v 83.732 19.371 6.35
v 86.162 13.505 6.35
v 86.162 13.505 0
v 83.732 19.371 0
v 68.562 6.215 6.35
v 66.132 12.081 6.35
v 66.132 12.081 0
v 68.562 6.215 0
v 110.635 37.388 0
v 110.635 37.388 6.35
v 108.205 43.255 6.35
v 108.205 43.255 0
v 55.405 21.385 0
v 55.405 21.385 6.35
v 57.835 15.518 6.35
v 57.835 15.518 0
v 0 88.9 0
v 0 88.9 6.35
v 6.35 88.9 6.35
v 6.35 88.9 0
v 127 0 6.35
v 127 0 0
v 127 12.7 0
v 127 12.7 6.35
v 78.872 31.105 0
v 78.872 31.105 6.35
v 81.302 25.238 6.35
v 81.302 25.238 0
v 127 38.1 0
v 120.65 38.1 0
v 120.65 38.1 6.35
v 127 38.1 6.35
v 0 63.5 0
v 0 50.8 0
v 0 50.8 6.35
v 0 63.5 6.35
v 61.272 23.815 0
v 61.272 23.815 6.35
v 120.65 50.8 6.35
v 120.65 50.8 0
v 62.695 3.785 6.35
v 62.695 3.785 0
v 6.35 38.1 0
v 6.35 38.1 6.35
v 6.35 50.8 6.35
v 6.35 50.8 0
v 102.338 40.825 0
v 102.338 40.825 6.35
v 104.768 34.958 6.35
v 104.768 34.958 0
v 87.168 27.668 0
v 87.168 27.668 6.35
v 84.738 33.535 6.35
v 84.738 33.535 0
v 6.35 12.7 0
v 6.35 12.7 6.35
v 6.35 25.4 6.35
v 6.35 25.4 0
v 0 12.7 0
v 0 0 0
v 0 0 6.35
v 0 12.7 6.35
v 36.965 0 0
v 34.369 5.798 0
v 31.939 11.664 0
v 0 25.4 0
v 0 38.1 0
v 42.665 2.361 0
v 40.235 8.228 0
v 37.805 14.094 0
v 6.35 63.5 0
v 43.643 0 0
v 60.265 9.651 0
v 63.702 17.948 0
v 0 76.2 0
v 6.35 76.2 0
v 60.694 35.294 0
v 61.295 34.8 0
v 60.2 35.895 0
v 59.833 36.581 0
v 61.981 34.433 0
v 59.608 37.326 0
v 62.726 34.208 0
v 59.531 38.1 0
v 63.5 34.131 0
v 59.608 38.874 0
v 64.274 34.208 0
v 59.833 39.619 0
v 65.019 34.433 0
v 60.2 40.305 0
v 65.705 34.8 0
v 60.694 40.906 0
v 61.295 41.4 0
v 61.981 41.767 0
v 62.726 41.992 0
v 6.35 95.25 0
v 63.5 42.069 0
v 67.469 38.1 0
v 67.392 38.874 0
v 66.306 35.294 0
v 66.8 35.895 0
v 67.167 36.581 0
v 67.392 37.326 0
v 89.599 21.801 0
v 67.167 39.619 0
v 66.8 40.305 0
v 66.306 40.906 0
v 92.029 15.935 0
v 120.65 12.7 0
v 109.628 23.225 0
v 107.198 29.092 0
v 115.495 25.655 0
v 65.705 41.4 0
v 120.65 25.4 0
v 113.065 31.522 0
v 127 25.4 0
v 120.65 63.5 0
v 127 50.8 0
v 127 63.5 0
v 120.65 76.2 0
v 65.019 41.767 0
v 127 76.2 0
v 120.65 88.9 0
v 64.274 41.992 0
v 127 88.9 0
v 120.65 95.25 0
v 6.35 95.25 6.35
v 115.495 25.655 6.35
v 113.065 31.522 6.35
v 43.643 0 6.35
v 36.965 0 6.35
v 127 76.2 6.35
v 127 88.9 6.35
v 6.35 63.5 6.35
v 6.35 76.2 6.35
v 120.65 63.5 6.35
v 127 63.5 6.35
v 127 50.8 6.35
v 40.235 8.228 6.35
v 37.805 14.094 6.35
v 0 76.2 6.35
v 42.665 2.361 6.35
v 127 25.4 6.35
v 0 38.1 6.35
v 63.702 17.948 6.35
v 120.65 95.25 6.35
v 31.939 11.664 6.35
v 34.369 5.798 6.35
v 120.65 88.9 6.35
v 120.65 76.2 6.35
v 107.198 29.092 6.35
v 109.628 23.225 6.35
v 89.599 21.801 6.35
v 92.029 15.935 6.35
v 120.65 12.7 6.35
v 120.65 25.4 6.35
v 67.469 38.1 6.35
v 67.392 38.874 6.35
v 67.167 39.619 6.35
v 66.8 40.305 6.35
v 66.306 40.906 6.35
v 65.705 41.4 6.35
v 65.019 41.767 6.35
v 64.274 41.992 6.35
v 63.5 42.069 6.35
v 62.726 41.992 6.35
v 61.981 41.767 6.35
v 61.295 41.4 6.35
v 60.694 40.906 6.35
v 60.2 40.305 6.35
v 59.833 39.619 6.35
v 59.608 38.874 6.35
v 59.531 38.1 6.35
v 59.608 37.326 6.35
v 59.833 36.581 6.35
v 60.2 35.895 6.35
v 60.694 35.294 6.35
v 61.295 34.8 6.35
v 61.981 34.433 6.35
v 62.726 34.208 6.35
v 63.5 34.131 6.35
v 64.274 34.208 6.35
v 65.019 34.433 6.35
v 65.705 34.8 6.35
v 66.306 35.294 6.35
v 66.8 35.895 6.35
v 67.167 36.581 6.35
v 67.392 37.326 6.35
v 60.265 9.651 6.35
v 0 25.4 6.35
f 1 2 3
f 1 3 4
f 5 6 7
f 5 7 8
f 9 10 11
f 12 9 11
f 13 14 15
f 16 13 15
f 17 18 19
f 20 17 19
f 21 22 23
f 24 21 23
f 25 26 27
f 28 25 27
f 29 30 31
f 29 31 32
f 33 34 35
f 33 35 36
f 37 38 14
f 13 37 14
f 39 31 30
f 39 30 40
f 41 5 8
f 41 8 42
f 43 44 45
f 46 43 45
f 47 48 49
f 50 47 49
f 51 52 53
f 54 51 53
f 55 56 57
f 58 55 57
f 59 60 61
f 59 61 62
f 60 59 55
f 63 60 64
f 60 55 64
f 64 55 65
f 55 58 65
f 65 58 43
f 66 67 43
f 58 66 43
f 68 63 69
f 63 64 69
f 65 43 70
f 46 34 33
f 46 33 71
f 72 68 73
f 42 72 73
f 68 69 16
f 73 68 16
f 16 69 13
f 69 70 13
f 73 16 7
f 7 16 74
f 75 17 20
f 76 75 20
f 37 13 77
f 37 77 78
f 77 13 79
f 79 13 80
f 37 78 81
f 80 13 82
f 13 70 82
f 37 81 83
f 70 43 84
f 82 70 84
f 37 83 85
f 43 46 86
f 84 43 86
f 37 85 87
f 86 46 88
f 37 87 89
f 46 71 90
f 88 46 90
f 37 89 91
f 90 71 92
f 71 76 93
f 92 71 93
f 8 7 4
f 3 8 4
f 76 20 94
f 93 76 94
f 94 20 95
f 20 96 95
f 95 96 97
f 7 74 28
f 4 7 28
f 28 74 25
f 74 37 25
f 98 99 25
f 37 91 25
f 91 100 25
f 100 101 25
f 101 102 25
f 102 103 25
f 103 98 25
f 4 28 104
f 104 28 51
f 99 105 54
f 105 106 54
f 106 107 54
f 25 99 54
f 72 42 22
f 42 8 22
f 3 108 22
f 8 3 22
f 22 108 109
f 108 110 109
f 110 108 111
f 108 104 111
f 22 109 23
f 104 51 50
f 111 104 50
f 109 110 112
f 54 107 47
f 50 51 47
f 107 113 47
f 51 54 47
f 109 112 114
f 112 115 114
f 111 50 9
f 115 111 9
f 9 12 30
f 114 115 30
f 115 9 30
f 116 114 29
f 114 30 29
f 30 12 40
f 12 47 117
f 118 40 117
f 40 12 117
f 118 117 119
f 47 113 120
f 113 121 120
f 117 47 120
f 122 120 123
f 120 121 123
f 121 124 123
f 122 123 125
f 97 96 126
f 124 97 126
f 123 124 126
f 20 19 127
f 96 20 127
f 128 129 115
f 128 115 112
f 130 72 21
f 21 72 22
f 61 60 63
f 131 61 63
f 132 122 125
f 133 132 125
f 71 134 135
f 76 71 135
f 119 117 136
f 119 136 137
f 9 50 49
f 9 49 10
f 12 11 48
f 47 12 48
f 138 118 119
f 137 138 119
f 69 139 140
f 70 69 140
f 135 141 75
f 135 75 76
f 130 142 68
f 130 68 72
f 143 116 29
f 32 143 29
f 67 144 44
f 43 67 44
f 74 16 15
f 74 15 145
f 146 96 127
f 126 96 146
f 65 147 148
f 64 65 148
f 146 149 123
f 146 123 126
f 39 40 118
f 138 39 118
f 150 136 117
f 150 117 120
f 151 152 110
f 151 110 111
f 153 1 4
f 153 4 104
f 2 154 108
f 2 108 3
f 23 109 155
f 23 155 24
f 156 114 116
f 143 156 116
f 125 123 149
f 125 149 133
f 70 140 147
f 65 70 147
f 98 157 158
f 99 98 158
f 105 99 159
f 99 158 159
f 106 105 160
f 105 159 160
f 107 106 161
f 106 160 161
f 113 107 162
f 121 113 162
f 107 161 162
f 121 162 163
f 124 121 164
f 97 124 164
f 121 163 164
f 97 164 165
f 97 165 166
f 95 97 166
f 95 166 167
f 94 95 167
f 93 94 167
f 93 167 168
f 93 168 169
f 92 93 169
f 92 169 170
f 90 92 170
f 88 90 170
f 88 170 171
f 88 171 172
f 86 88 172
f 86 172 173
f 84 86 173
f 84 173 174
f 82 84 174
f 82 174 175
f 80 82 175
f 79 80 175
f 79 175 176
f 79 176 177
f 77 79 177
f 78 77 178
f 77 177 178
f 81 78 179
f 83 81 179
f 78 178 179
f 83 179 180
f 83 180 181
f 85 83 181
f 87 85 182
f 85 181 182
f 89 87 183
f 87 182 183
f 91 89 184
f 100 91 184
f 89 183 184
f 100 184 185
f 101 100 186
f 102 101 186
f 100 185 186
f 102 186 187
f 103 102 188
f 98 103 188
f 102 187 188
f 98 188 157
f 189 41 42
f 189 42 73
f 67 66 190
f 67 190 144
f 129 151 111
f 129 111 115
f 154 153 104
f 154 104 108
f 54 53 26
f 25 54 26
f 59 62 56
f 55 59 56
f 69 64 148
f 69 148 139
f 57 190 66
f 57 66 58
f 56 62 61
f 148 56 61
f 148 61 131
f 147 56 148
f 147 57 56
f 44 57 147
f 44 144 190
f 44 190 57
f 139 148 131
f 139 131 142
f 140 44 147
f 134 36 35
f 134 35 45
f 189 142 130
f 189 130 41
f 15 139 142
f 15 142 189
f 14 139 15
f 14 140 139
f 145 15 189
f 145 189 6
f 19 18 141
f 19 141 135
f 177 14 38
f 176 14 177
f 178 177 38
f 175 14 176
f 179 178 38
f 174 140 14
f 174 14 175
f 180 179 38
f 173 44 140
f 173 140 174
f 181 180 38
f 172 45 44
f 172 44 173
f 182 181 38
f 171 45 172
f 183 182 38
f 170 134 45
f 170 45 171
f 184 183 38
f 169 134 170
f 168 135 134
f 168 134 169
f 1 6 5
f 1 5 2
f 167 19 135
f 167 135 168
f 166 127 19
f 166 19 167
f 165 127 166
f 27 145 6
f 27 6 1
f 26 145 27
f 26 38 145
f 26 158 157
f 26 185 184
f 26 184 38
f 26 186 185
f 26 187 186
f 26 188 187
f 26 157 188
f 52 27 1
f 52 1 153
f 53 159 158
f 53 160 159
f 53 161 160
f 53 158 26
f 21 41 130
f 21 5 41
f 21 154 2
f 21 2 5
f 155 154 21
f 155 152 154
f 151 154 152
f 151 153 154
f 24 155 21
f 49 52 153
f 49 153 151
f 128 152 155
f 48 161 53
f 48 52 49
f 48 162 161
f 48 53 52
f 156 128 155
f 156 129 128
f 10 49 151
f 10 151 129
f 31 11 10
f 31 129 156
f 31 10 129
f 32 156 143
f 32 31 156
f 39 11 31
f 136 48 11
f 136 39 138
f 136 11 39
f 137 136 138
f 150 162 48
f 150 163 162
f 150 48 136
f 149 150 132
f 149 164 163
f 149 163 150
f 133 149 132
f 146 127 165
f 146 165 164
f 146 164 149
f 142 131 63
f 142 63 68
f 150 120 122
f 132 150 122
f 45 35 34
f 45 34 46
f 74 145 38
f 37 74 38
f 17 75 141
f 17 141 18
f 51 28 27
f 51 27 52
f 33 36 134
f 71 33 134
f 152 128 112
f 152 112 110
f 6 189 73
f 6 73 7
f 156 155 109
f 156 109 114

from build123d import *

# Parameters (mm, degrees)
SKETCH1_W           = 127
SKETCH1_H           = 95.25
BOSS_EXTRUDE1_DEPTH = 6.35
SKETCH2_R           = 3.96875
CUT_EXTRUDE1_DEPTH  = 7.35
SKETCH3_W           = 6.35
SKETCH3_H           = 12.7
CUT_EXTRUDE2_DEPTH  = 7.35
SKETCH4_W           = 6.35
SKETCH4_H           = 12.7
CUT_EXTRUDE3_DEPTH  = 7.35
LPATTERN1_COUNT     = 4
LPATTERN1_PITCH     = 25.4
CUT_EXTRUDE4_DEPTH  = 7.35
LPATTERN2_COUNT     = 4
LPATTERN2_PITCH     = 25.4


with BuildPart() as part:
    # Sketch1 → Boss-Extrude1 (new body)
    with BuildSketch(Plane.XY):
        with Locations((63.5, 47.625)):
            Rectangle(SKETCH1_W, SKETCH1_H)
    extrude(amount=BOSS_EXTRUDE1_DEPTH)

    # Sketch2 → Cut-Extrude1 (cut, through all)
    with BuildSketch(Plane.XY.offset(6.35)):
        with Locations((63.5, 38.1)):
            Circle(SKETCH2_R)
    extrude(amount=-CUT_EXTRUDE1_DEPTH, mode=Mode.SUBTRACT)

    # Sketch3 → Cut-Extrude2 (cut, through all)
    with BuildSketch(Plane.XY.offset(6.35)):
        with Locations((3.175, 19.05)):
            Rectangle(SKETCH3_W, SKETCH3_H)
    cut_extrude2 = extrude(amount=-CUT_EXTRUDE2_DEPTH, mode=Mode.SUBTRACT)

    # Sketch4 → Cut-Extrude3 (cut, through all)
    with BuildSketch(Plane.XY.offset(6.35)):
        with Locations((123.825, 19.05)):
            Rectangle(SKETCH4_W, SKETCH4_H)
    cut_extrude3 = extrude(amount=-CUT_EXTRUDE3_DEPTH, mode=Mode.SUBTRACT)

    # LPattern1: Cut-Extrude2, Cut-Extrude3 ×4
    with Locations(*[(0, i * LPATTERN1_PITCH, 0) for i in range(1, LPATTERN1_COUNT)]):
        add(cut_extrude2, mode=Mode.SUBTRACT)
        add(cut_extrude3, mode=Mode.SUBTRACT)

    # Sketch5 → Cut-Extrude4 (cut, through all)
    with BuildSketch(Plane.XY.offset(6.35)):
        Polygon((102.338352728, 40.824853058), (104.768392524, 34.958218027), (110.635027555, 37.388257822), (108.20498776, 43.254892854), align=None)
        Polygon((109.628472115, 23.224947964), (107.198432319, 29.091582995), (113.065067351, 31.521622791), (115.495107146, 25.65498776), align=None)
    cut_extrude4 = extrude(amount=-CUT_EXTRUDE4_DEPTH, mode=Mode.SUBTRACT)

    # LPattern2: Cut-Extrude4 ×4
    with Locations(*[Vector(-0.923879533, -0.382683432, 0) * (i * LPATTERN2_PITCH) for i in range(1, LPATTERN2_COUNT)]):
        add(cut_extrude4, mode=Mode.SUBTRACT)


solid = part.part
